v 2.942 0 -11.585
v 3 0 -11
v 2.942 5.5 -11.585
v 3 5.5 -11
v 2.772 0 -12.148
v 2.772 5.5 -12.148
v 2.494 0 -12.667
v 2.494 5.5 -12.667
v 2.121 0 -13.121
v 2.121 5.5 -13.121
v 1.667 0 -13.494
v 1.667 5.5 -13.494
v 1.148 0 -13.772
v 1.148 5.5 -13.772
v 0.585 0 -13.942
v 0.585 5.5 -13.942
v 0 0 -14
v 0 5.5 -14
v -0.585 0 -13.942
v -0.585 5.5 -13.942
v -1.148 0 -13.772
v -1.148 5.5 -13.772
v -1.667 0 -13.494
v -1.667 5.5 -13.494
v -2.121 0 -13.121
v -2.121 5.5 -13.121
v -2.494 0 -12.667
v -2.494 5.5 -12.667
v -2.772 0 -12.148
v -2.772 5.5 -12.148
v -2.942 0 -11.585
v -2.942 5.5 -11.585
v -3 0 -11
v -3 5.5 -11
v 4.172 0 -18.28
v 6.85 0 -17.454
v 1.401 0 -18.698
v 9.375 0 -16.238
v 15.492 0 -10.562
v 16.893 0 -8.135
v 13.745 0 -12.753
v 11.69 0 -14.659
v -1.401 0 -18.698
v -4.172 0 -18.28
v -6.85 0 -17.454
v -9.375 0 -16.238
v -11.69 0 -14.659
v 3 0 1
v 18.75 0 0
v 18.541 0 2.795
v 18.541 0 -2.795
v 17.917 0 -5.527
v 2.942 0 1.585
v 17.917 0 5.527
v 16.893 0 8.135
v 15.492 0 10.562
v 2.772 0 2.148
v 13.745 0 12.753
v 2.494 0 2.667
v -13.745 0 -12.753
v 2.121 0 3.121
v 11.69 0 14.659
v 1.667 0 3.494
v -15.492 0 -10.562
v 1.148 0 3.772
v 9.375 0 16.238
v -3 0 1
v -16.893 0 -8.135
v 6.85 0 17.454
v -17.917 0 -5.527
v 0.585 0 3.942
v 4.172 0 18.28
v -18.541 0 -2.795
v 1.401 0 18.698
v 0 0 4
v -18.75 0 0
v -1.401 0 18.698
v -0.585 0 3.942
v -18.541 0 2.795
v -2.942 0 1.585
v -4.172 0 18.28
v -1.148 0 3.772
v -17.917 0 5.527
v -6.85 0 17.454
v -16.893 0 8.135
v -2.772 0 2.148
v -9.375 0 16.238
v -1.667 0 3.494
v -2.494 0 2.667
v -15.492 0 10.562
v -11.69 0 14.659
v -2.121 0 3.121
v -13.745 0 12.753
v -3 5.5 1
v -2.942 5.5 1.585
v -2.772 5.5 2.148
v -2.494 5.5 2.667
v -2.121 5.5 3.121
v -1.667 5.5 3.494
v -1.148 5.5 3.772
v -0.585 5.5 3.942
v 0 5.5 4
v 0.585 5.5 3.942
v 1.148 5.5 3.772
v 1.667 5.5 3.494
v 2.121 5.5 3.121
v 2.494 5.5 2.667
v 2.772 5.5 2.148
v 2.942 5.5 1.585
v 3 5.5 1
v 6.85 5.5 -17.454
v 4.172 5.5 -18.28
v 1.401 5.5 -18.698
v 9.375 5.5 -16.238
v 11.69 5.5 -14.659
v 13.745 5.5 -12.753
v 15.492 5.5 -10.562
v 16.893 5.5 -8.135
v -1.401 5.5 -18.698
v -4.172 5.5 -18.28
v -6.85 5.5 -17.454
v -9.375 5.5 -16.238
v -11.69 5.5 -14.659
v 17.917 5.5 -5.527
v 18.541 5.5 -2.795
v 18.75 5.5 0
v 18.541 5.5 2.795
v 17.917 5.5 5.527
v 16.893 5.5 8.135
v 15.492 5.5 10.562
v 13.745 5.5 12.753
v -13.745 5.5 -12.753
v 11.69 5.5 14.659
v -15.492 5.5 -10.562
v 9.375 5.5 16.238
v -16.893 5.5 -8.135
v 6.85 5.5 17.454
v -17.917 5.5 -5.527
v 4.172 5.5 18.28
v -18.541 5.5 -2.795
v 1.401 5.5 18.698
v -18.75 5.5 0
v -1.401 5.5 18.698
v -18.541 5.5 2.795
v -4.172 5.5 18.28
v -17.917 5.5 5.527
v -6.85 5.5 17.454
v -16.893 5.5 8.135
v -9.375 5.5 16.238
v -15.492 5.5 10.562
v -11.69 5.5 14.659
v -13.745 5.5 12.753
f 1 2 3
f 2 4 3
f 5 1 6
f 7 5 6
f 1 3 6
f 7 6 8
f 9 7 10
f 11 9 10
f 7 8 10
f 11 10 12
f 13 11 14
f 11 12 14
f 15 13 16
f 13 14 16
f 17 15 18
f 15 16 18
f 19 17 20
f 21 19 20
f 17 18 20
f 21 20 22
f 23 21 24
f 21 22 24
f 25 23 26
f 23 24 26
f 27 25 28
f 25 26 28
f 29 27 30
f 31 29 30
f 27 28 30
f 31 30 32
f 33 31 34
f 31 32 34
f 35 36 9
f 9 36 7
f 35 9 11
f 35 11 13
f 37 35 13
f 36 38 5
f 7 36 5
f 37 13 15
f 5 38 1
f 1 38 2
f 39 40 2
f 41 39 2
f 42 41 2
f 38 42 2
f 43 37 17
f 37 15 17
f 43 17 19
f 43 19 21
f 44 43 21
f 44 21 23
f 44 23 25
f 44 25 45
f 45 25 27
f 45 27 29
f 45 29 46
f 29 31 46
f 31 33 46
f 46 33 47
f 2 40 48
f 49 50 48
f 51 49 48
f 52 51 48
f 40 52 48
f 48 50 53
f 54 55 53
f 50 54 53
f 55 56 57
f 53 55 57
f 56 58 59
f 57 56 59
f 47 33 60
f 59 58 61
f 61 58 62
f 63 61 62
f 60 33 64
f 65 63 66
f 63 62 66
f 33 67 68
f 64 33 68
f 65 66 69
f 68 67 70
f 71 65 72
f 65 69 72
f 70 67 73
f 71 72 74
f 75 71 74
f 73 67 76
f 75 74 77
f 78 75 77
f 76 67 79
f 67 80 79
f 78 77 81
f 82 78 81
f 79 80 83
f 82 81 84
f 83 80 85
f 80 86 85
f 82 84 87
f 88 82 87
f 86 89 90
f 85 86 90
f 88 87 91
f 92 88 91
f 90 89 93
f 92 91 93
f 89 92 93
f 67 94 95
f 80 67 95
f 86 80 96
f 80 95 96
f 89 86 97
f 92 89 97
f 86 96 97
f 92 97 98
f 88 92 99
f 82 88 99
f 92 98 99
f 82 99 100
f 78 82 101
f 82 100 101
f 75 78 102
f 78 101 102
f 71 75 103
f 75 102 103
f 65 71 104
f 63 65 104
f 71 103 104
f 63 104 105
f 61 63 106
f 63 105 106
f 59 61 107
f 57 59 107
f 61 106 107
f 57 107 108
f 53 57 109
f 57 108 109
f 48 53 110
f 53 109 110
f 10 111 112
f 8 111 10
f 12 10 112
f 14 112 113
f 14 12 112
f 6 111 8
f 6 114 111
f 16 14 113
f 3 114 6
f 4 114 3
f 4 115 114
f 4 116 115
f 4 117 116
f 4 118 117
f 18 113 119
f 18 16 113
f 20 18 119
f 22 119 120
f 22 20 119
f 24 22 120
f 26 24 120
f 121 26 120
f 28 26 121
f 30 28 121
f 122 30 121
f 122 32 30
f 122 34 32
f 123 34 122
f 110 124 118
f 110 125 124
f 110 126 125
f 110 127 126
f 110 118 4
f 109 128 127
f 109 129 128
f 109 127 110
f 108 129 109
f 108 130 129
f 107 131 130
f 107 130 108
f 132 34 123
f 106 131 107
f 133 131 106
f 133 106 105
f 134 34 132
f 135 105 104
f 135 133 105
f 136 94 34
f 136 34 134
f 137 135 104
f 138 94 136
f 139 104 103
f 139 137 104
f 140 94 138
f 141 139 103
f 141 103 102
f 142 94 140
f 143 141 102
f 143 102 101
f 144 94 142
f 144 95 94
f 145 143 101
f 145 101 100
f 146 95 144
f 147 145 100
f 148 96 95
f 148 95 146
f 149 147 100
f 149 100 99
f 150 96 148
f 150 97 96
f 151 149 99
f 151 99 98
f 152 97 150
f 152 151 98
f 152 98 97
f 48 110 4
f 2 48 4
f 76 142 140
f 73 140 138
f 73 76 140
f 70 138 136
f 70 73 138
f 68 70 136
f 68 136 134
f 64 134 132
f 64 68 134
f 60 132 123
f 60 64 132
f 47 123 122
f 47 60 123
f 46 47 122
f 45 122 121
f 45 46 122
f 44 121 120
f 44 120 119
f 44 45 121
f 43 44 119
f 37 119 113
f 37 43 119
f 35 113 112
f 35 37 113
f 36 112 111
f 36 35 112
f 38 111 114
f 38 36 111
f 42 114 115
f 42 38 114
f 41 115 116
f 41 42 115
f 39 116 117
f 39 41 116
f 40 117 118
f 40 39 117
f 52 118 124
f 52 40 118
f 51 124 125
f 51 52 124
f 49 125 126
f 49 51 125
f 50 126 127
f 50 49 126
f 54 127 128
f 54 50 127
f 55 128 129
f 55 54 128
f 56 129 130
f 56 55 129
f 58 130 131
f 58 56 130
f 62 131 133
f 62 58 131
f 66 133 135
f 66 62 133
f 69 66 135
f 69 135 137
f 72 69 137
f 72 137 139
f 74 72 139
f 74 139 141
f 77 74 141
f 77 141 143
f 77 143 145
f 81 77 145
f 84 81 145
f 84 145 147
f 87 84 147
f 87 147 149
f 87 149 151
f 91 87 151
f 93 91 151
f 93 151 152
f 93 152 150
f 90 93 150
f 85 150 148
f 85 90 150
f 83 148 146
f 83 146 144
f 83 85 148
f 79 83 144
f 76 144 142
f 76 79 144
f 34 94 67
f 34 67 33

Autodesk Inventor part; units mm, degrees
ref_plane "YZ Plane" through (0, 0, 0) normal (1, 0, 0) x (0, 1, 0)
ref_plane "XZ Plane" through (0, 0, 0) normal (0, 1, 0) x (-1, 0, 0)
ref_plane "XY Plane" through (0, 0, 0) normal (0, 0, 1) x (1, 0, 0)
sketch "スケッチ1" plane through (0, 0, 0) normal (0, 1, 0) x (-1, 0, 0)
  circle A0 centre (0, 0) radius 22.5 construction
  circle A1 centre (0, 0) radius 25.5 construction
  line L0 (25.5, 1.2181) -> (25.5, -1.2181)
  line L1 (25.5, 1.2181) -> (22.3764, 2.355)
  line L2 (25.5, -1.2181) -> (22.3764, -2.355)
  line L3 (35.7, 0) -> (-35.7, 0) projected
  circle A2 centre (0, 0) radius 18.75
  line L4 (22.3764, -2.355) -> (18.647, -1.9625)
  line L5 (22.3764, 2.355) -> (18.647, 1.9625)
  line L6 (19.484, 11.2527) -> (16.2367, 9.3773)
  line L7 (22.8, 11.4846) -> (19.484, 11.2527)
  line L8 (22.8, 11.4846) -> (23.7909, 9.259)
  line L9 (23.7909, 9.259) -> (21.3997, 6.9499)
  line L10 (21.3997, 6.9499) -> (17.8331, 5.7916)
  line L11 (13.2226, 18.2047) -> (11.0189, 15.1706)
  line L12 (16.1576, 19.7653) -> (13.2226, 18.2047)
  line L13 (16.1576, 19.7653) -> (17.9681, 18.1351)
  line L14 (17.9681, 18.1351) -> (16.7229, 15.0531)
  line L15 (16.7229, 15.0531) -> (13.9357, 12.5443)
  line L16 (4.675, 22.009) -> (3.8958, 18.3408)
  line L17 (6.7214, 24.6284) -> (4.675, 22.009)
  line L18 (6.7214, 24.6284) -> (9.0384, 23.8755)
  line L19 (9.0384, 23.8755) -> (9.1544, 20.5535)
  line L20 (9.1544, 20.5535) -> (7.6287, 17.1279)
  line L21 (-4.6811, 22.0077) -> (-3.9009, 18.3397)
  line L22 (-3.8769, 25.233) -> (-4.6811, 22.0077)
  line L23 (-3.8769, 25.233) -> (-1.454, 25.4876)
  line L24 (-1.454, 25.4876) -> (0.0031, 22.5)
  line L25 (0.0031, 22.5) -> (0.0026, 18.75)
  line L26 (-13.2277, 18.201) -> (-11.0231, 15.1675)
  line L27 (-13.8049, 21.4746) -> (-13.2277, 18.201)
  line L28 (-13.8049, 21.4746) -> (-11.6951, 22.6927)
  line L29 (-11.6951, 22.6927) -> (-9.1487, 20.556)
  line L30 (-9.1487, 20.556) -> (-7.6239, 17.13)
  line L31 (-19.4871, 11.2473) -> (-16.2393, 9.3727)
  line L32 (-21.3459, 14.0031) -> (-19.4871, 11.2473)
  line L33 (-21.3459, 14.0031) -> (-19.9139, 15.974)
  line L34 (-19.9139, 15.974) -> (-16.7187, 15.0578)
  line L35 (-16.7187, 15.0578) -> (-13.9322, 12.5481)
  line L36 (-22.3771, 2.3488) -> (-18.6476, 1.9573)
  line L37 (-25.196, 4.1103) -> (-22.3771, 2.3488)
  line L38 (-25.196, 4.1103) -> (-24.6895, 6.4932)
  line L39 (-24.6895, 6.4932) -> (-21.3978, 6.9559)
  line L40 (-21.3978, 6.9559) -> (-17.8315, 5.7965)
  line L41 (-21.3978, -6.9559) -> (-17.8315, -5.7965)
  line L42 (-24.6895, -6.4932) -> (-21.3978, -6.9559)
  line L43 (-24.6895, -6.4932) -> (-25.196, -4.1103)
  line L44 (-25.196, -4.1103) -> (-22.3771, -2.3488)
  line L45 (-22.3771, -2.3488) -> (-18.6476, -1.9573)
  line L46 (-16.7187, -15.0578) -> (-13.9322, -12.5481)
  line L47 (-19.9139, -15.974) -> (-16.7187, -15.0578)
  line L48 (-19.9139, -15.974) -> (-21.3459, -14.0031)
  line L49 (-21.3459, -14.0031) -> (-19.4871, -11.2473)
  line L50 (-19.4871, -11.2473) -> (-16.2393, -9.3727)
  line L51 (-9.1487, -20.556) -> (-7.6239, -17.13)
  line L52 (-11.6951, -22.6927) -> (-9.1487, -20.556)
  line L53 (-11.6951, -22.6927) -> (-13.8049, -21.4746)
  line L54 (-13.8049, -21.4746) -> (-13.2277, -18.201)
  line L55 (-13.2277, -18.201) -> (-11.0231, -15.1675)
  line L56 (0.0031, -22.5) -> (0.0026, -18.75)
  line L57 (-1.454, -25.4876) -> (0.0031, -22.5)
  line L58 (-1.454, -25.4876) -> (-3.8769, -25.233)
  line L59 (-3.8769, -25.233) -> (-4.6811, -22.0077)
  line L60 (-4.6811, -22.0077) -> (-3.9009, -18.3397)
  line L61 (9.1544, -20.5535) -> (7.6287, -17.1279)
  line L62 (9.0384, -23.8755) -> (9.1544, -20.5535)
  line L63 (9.0384, -23.8755) -> (6.7214, -24.6284)
  line L64 (6.7214, -24.6284) -> (4.675, -22.009)
  line L65 (4.675, -22.009) -> (3.8958, -18.3408)
  line L66 (16.7229, -15.0531) -> (13.9357, -12.5443)
  line L67 (17.9681, -18.1351) -> (16.7229, -15.0531)
  line L68 (17.9681, -18.1351) -> (16.1576, -19.7653)
  line L69 (16.1576, -19.7653) -> (13.2226, -18.2047)
  line L70 (13.2226, -18.2047) -> (11.0189, -15.1706)
  line L71 (21.3997, -6.9499) -> (17.8331, -5.7916)
  line L72 (23.7909, -9.259) -> (21.3997, -6.9499)
  line L73 (23.7909, -9.259) -> (22.8, -11.4846)
  line L74 (22.8, -11.4846) -> (19.484, -11.2527)
  line L75 (19.484, -11.2527) -> (16.2367, -9.3773)
  circle A3 centre (0, 0) radius 11
  point P0 (25.5, 0)
  point P1 (23.2954, 10.3718)
  point P2 (17.0628, 18.9502)
  point P3 (7.8799, 24.2519)
  point P4 (-2.6655, 25.3603)
  point P5 (-12.75, 22.0836)
  point P6 (-20.6299, 14.9885)
  point P7 (-24.9428, 5.3017)
  point P8 (-24.9428, -5.3017)
  point P9 (-20.6299, -14.9885)
  point P10 (-12.75, -22.0836)
  point P11 (-2.6655, -25.3603)
  point P12 (7.8799, -24.2519)
  point P13 (17.0628, -18.9502)
  point P14 (23.2954, -10.3718)
  point P15 (17.8331, 5.7916)
  point P16 (16.2367, 9.3773)
  point P17 (13.9357, 12.5443)
  point P18 (11.0189, 15.1706)
  point P19 (7.6287, 17.1279)
  point P20 (3.8958, 18.3408)
  point P21 (0.0026, 18.75)
  point P22 (-3.9009, 18.3397)
  point P23 (-7.6239, 17.13)
  point P24 (-11.0231, 15.1675)
  point P25 (-13.9322, 12.5481)
  point P26 (-16.2393, 9.3727)
  point P27 (-17.8315, 5.7965)
  point P28 (-18.6476, 1.9573)
  point P29 (-18.6476, -1.9573)
  point P30 (-17.8315, -5.7965)
  point P31 (-16.2393, -9.3727)
  point P32 (-13.9322, -12.5481)
  point P33 (-11.0231, -15.1675)
  point P34 (-7.6239, -17.13)
  point P35 (-3.9009, -18.3397)
  point P36 (0.0026, -18.75)
  point P37 (3.8958, -18.3408)
  point P38 (7.6287, -17.1279)
  point P39 (11.0189, -15.1706)
  point P40 (13.9357, -12.5443)
  point P41 (16.2367, -9.3773)
  point P42 (17.8331, -5.7916)
  dimension "d5" = 37.5
  dimension "d0" = 45
  dimension "d1" = 51
  dimension "d3" = 20
  dimension "d4" = 20
  dimension "d14" = 4.71
  dimension "d18" = 360
  dimension "d23" = 22
extrude "押し出し1" add sketch "スケッチ1" along normal blind 5.5 contours A2 L3 A3 | L3 A3 A2 | A3 L3 | L3 A3
sketch "スケッチ2" plane through (0, 5.5, 0) normal (0, 1, 0) x (1, 0, 0)
  circle A0 centre (0, 10) radius 3 construction
  circle A1 centre (0, 0) radius 3 construction
  line L0 (-3, 10) -> (-3, 0)
  line L1 (3, 10) -> (3, 0)
  circle A2 centre (0, 11) radius 3
  circle A3 centre (0, -1) radius 3
  line L2 (3, 10) -> (3, 11)
  line L3 (-3, 10) -> (-3, 11)
  line L4 (3, 0) -> (3, -1)
  line L5 (-3, 0) -> (-3, -1)
  dimension "d30" = 6
  dimension "d31" = 6
  dimension "d32" = 10
  dimension "d33" = 6
  dimension "d34" = 6
  dimension "d35" = 1
  dimension "d36" = 1
extrude "押し出し2" cut sketch "スケッチ2" against normal through all
properties part number "M3_15_ホーン" material "木材 (カエデ材)"
